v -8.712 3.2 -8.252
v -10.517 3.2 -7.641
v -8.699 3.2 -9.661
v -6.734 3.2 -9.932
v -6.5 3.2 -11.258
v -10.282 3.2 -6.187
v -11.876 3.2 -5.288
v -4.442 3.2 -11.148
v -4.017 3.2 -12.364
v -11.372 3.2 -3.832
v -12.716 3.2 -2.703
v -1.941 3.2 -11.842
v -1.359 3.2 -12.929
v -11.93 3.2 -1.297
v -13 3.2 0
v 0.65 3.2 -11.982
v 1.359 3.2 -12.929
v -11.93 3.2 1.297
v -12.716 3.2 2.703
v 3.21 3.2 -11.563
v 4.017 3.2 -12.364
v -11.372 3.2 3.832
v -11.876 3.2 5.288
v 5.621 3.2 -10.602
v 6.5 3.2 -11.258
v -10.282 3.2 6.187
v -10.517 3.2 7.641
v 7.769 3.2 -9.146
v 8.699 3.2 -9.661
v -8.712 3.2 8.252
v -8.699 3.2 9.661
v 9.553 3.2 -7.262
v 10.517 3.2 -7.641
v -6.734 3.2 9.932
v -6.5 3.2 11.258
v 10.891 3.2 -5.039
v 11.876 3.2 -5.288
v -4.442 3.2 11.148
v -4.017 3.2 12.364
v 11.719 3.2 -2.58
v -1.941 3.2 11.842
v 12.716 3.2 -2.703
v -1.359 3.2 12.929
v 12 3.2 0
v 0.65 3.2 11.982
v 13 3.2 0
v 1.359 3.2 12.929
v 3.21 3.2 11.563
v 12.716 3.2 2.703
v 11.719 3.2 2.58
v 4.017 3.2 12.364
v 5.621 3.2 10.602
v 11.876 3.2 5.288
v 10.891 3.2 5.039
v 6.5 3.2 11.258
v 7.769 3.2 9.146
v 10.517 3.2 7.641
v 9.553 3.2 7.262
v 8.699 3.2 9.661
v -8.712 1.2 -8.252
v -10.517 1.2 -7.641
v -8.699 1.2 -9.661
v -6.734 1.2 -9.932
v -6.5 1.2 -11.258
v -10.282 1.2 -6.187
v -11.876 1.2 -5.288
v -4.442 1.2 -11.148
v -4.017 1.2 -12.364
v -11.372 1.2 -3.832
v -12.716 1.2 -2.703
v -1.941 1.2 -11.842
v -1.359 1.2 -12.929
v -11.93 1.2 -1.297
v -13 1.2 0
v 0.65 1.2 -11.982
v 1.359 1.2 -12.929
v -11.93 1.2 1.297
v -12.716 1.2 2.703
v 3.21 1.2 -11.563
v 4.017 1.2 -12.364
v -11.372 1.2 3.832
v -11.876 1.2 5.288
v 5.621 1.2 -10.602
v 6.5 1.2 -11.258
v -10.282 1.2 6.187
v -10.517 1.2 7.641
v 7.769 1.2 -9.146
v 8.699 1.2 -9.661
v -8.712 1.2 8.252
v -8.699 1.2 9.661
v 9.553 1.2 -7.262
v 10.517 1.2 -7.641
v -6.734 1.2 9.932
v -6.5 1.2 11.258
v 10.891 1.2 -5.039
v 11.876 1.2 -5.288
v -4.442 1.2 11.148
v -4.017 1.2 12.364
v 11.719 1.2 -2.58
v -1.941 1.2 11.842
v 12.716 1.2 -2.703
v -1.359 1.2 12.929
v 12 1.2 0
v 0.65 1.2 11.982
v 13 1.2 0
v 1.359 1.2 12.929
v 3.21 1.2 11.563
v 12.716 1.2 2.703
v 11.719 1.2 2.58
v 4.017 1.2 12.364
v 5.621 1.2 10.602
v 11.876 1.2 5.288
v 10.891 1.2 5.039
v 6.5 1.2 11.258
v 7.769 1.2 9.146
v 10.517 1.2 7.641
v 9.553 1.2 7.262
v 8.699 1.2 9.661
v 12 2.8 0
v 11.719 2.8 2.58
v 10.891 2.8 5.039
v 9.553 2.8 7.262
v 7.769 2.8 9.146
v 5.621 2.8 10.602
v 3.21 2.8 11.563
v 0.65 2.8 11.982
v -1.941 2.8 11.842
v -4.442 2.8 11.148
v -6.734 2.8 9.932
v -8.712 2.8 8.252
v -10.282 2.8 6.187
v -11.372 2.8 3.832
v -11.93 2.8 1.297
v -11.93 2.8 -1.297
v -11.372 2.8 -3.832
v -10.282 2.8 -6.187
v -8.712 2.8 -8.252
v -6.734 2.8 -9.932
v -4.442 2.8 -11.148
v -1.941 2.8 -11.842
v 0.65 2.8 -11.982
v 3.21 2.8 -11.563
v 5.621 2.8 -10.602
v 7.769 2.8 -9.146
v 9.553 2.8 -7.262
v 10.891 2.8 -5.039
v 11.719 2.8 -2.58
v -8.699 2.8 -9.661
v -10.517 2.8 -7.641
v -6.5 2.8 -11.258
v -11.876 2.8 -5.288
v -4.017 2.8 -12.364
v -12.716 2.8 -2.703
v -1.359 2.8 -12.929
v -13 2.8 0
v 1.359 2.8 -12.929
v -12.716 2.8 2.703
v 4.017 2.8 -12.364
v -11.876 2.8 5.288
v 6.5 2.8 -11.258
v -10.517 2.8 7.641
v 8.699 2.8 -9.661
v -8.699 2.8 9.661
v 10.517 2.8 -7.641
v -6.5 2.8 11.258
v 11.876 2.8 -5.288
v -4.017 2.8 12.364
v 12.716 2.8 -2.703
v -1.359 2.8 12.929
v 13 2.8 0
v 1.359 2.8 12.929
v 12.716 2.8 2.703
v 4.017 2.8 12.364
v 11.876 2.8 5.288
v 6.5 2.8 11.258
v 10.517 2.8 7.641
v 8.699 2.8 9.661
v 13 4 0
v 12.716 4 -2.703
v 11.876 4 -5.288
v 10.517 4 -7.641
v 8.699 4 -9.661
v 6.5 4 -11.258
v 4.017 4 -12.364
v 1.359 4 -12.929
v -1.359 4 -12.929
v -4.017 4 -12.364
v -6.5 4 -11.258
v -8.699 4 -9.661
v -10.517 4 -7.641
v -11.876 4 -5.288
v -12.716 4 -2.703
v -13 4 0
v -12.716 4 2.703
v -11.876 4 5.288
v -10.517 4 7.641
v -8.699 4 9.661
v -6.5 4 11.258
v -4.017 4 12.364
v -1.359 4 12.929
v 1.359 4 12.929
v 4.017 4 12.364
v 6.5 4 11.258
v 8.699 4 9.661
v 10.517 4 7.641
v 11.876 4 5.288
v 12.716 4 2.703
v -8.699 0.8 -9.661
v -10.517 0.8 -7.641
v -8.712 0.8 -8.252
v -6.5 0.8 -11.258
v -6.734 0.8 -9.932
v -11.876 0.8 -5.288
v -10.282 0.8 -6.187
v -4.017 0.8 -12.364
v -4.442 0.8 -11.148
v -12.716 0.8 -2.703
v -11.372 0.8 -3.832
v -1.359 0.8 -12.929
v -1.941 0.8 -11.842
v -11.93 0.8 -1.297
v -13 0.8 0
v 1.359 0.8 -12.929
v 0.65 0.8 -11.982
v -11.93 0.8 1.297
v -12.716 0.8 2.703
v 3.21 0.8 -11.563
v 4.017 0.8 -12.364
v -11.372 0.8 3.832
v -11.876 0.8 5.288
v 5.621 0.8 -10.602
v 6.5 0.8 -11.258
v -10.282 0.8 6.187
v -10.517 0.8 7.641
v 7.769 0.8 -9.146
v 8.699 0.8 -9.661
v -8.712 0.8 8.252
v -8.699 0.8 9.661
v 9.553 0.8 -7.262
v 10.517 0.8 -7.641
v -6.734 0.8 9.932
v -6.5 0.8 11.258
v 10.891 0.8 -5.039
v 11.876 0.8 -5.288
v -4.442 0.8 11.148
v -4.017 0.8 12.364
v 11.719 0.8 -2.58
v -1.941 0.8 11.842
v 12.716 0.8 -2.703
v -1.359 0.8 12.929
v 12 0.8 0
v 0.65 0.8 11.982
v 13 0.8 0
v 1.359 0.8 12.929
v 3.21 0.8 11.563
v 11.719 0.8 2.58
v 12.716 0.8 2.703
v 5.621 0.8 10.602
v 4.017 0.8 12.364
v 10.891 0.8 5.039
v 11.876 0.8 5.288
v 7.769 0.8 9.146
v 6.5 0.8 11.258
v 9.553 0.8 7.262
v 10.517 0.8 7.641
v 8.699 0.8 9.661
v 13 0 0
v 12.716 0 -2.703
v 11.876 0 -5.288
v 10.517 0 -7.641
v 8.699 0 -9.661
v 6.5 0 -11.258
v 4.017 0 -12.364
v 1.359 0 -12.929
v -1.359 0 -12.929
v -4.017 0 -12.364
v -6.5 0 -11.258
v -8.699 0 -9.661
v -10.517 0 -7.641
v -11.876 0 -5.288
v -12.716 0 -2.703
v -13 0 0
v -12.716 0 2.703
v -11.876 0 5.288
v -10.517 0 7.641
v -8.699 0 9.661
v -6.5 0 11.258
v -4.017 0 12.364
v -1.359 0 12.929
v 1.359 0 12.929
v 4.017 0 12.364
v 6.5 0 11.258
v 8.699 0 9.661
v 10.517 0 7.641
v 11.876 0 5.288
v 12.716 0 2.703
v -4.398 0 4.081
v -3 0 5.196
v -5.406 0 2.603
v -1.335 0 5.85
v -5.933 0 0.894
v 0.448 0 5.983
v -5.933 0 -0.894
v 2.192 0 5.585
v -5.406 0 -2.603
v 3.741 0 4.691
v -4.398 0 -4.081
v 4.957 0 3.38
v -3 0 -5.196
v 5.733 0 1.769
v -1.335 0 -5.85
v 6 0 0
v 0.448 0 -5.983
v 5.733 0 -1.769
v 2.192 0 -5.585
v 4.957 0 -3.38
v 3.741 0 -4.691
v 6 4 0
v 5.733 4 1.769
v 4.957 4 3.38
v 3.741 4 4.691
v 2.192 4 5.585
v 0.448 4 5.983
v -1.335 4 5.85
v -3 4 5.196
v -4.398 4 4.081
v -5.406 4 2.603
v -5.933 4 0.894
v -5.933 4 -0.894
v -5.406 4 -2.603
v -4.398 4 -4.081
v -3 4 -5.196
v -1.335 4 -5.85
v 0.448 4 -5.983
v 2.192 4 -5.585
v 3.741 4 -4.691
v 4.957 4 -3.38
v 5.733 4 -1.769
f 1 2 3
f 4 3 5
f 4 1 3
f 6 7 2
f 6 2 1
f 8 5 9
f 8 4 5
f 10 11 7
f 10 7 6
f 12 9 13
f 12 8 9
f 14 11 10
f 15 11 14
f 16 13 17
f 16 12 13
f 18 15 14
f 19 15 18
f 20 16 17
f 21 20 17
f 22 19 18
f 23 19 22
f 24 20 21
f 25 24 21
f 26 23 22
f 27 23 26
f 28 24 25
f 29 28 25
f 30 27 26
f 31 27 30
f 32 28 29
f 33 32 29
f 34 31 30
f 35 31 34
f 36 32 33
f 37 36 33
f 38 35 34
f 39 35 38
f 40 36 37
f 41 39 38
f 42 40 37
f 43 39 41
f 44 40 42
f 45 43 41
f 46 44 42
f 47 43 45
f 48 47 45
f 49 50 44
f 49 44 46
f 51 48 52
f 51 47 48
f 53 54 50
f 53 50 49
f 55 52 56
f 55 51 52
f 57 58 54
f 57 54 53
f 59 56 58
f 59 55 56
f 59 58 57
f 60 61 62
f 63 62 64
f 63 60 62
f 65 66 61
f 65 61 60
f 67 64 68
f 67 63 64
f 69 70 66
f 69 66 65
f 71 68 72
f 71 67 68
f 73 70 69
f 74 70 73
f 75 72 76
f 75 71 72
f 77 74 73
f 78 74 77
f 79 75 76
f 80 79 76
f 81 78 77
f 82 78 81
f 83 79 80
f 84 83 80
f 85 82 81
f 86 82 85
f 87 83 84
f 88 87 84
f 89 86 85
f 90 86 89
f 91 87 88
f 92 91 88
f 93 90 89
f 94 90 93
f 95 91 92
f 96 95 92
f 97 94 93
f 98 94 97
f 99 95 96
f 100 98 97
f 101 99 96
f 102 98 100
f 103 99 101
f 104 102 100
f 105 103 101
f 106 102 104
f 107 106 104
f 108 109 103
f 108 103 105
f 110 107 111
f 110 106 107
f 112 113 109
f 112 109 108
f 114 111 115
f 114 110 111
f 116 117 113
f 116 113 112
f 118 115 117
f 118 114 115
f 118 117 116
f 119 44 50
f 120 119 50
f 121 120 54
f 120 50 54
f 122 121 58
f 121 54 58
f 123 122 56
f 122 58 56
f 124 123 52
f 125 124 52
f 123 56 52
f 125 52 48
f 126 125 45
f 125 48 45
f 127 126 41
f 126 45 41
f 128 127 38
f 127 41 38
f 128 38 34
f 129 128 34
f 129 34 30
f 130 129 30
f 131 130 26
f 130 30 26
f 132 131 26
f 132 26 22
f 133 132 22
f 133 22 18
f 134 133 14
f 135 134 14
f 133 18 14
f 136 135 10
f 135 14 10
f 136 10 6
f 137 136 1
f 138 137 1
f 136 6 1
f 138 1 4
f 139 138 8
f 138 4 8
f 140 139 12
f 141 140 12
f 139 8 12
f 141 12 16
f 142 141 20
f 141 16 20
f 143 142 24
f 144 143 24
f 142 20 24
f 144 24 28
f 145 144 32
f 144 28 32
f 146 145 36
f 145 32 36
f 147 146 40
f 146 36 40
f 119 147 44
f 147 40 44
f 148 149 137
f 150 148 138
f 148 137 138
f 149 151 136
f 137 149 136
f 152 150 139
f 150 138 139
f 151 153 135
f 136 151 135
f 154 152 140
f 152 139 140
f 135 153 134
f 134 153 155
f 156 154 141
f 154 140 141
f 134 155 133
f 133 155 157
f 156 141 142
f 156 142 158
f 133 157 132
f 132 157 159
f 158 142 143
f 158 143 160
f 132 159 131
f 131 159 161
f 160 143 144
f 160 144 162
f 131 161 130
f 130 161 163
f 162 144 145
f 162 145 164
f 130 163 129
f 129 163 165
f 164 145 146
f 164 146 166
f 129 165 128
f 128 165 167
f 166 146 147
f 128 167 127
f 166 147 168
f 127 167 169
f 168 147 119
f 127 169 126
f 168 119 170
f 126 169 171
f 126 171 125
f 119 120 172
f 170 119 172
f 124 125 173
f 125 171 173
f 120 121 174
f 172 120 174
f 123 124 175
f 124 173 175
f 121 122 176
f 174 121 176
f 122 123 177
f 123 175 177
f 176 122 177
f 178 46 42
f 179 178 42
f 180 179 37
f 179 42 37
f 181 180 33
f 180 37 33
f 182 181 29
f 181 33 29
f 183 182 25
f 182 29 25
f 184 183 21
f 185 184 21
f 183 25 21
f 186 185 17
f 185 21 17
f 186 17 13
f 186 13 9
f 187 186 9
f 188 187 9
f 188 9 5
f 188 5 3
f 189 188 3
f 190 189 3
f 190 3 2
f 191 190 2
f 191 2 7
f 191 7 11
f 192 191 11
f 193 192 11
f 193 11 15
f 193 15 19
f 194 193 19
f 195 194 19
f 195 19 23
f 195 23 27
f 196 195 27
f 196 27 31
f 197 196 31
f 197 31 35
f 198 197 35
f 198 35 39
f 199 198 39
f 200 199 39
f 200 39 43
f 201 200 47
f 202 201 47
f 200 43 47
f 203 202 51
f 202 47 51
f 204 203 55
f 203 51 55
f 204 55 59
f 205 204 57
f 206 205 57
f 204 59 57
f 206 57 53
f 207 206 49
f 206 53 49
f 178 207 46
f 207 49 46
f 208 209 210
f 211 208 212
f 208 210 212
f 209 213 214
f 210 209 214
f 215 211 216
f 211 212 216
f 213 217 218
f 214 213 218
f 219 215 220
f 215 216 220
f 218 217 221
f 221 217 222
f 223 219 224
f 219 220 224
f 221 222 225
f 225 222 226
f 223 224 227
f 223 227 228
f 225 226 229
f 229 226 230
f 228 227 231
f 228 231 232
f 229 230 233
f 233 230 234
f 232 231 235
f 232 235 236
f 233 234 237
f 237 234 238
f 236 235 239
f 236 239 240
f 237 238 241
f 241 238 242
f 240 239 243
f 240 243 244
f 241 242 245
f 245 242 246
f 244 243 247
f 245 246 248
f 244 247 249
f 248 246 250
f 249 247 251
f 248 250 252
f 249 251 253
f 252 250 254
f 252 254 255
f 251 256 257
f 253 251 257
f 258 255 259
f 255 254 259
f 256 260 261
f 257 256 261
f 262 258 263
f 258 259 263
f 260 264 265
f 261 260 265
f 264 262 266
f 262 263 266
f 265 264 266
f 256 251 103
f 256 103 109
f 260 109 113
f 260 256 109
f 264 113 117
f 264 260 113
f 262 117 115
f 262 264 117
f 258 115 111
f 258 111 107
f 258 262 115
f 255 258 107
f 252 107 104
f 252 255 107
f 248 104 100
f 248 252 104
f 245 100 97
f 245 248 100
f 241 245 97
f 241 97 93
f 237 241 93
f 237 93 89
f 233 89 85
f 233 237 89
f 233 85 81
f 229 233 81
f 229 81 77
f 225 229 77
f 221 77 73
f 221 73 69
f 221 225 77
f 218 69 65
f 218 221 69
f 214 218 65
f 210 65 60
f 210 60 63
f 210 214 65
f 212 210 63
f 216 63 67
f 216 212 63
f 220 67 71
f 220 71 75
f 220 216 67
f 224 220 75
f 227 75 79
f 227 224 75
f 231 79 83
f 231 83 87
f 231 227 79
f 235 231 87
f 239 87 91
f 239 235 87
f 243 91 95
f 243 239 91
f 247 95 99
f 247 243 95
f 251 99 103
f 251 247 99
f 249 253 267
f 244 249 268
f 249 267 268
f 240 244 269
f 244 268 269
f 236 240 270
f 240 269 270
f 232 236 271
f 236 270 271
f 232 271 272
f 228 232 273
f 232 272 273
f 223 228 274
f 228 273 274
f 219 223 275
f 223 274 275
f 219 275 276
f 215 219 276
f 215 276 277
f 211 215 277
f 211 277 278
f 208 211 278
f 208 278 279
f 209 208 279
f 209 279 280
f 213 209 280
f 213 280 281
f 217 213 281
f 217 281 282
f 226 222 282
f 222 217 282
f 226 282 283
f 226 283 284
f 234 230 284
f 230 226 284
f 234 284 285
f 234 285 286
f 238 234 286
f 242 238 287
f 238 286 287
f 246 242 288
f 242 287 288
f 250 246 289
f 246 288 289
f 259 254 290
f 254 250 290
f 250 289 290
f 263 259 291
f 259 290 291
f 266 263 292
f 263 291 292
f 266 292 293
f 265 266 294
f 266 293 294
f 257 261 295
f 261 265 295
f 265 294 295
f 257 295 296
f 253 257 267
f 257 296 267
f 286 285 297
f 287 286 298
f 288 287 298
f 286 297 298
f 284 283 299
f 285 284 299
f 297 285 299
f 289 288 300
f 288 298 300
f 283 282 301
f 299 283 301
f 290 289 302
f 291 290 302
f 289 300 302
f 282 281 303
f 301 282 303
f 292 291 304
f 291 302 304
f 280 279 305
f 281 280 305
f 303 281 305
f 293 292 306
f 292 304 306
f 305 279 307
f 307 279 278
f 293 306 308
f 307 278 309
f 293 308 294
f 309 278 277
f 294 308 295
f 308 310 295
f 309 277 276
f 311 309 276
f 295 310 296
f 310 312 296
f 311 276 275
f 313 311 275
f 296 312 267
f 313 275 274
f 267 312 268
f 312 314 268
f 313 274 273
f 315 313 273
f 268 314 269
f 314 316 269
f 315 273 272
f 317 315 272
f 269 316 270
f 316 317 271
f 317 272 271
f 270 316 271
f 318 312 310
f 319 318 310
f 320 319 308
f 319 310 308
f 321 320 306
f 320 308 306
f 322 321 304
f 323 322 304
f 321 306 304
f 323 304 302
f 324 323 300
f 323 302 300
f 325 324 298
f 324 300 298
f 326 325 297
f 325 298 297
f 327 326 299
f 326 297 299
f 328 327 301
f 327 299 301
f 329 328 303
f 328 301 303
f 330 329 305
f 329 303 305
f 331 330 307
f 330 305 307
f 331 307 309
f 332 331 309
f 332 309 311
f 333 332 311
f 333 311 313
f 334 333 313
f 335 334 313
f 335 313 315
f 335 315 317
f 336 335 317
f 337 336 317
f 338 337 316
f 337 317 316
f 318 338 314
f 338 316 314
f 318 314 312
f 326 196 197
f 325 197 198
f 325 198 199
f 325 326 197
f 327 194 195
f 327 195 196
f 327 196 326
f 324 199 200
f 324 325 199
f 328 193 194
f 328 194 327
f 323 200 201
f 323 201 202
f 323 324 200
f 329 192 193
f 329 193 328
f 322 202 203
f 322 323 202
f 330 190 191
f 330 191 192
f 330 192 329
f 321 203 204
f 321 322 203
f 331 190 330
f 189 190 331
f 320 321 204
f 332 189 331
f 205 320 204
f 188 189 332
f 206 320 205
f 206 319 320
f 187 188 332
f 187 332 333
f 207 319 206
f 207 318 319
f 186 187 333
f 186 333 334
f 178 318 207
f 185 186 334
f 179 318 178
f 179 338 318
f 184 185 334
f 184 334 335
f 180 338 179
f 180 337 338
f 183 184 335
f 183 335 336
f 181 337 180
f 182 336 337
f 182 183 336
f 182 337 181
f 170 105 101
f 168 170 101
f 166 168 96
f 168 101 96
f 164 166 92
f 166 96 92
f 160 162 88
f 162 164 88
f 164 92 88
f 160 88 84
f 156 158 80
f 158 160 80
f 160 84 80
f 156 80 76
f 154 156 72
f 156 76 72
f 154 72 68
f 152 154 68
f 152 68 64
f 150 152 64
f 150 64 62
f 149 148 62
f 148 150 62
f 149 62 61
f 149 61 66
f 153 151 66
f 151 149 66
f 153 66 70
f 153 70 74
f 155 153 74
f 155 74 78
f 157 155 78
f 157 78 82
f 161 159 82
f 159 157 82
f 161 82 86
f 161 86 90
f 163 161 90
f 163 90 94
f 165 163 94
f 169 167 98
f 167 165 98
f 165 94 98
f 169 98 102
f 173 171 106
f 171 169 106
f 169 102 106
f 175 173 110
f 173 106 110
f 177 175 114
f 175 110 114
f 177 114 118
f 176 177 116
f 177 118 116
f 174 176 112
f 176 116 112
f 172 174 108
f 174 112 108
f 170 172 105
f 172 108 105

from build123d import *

# Parameters (mm, degrees)
SKETCH_1_R          = 13
EXTRUDE_1_DEPTH     = 4
SKETCH_2_R          = 6
CUT_EXTRUDE_1_DEPTH = 4
CUT_EXTRUDE_START   = -0.8
SKETCH_3_R          = 13
SKETCH_3_R_2        = 12
CUT_EXTRUDE_2_DEPTH = 0.4
CUT_EXTRUDE_START_2 = -2.8
SKETCH_3_3_R        = 13
SKETCH_3_3_R_2      = 12
CUT_EXTRUDE_3_DEPTH = 0.4


with BuildPart() as part:
    # 草图1 → 凸台-拉伸1 (new body)
    with BuildSketch(Plane(origin=(0, 0, 0), x_dir=(1, 0, 0), z_dir=(0, 1, 0))):
        Circle(SKETCH_1_R)
    extrude(amount=EXTRUDE_1_DEPTH)

    # 草图2 → 切除-拉伸1 (cut)
    with BuildSketch(Plane.XZ):
        Circle(SKETCH_2_R)
    extrude(amount=-CUT_EXTRUDE_1_DEPTH, mode=Mode.SUBTRACT)

    # 草图3 → 切除-拉伸2 (cut)
    with BuildSketch(Plane.XZ.offset(CUT_EXTRUDE_START)):
        Circle(SKETCH_3_R)
        Circle(SKETCH_3_R_2, mode=Mode.SUBTRACT)
    extrude(amount=-CUT_EXTRUDE_2_DEPTH, mode=Mode.SUBTRACT)

    # 草图3<3> → 切除-拉伸3 (cut)
    with BuildSketch(Plane.XZ.offset(CUT_EXTRUDE_START_2)):
        Circle(SKETCH_3_3_R)
        Circle(SKETCH_3_3_R_2, mode=Mode.SUBTRACT)
    extrude(amount=-CUT_EXTRUDE_3_DEPTH, mode=Mode.SUBTRACT)


solid = part.part
